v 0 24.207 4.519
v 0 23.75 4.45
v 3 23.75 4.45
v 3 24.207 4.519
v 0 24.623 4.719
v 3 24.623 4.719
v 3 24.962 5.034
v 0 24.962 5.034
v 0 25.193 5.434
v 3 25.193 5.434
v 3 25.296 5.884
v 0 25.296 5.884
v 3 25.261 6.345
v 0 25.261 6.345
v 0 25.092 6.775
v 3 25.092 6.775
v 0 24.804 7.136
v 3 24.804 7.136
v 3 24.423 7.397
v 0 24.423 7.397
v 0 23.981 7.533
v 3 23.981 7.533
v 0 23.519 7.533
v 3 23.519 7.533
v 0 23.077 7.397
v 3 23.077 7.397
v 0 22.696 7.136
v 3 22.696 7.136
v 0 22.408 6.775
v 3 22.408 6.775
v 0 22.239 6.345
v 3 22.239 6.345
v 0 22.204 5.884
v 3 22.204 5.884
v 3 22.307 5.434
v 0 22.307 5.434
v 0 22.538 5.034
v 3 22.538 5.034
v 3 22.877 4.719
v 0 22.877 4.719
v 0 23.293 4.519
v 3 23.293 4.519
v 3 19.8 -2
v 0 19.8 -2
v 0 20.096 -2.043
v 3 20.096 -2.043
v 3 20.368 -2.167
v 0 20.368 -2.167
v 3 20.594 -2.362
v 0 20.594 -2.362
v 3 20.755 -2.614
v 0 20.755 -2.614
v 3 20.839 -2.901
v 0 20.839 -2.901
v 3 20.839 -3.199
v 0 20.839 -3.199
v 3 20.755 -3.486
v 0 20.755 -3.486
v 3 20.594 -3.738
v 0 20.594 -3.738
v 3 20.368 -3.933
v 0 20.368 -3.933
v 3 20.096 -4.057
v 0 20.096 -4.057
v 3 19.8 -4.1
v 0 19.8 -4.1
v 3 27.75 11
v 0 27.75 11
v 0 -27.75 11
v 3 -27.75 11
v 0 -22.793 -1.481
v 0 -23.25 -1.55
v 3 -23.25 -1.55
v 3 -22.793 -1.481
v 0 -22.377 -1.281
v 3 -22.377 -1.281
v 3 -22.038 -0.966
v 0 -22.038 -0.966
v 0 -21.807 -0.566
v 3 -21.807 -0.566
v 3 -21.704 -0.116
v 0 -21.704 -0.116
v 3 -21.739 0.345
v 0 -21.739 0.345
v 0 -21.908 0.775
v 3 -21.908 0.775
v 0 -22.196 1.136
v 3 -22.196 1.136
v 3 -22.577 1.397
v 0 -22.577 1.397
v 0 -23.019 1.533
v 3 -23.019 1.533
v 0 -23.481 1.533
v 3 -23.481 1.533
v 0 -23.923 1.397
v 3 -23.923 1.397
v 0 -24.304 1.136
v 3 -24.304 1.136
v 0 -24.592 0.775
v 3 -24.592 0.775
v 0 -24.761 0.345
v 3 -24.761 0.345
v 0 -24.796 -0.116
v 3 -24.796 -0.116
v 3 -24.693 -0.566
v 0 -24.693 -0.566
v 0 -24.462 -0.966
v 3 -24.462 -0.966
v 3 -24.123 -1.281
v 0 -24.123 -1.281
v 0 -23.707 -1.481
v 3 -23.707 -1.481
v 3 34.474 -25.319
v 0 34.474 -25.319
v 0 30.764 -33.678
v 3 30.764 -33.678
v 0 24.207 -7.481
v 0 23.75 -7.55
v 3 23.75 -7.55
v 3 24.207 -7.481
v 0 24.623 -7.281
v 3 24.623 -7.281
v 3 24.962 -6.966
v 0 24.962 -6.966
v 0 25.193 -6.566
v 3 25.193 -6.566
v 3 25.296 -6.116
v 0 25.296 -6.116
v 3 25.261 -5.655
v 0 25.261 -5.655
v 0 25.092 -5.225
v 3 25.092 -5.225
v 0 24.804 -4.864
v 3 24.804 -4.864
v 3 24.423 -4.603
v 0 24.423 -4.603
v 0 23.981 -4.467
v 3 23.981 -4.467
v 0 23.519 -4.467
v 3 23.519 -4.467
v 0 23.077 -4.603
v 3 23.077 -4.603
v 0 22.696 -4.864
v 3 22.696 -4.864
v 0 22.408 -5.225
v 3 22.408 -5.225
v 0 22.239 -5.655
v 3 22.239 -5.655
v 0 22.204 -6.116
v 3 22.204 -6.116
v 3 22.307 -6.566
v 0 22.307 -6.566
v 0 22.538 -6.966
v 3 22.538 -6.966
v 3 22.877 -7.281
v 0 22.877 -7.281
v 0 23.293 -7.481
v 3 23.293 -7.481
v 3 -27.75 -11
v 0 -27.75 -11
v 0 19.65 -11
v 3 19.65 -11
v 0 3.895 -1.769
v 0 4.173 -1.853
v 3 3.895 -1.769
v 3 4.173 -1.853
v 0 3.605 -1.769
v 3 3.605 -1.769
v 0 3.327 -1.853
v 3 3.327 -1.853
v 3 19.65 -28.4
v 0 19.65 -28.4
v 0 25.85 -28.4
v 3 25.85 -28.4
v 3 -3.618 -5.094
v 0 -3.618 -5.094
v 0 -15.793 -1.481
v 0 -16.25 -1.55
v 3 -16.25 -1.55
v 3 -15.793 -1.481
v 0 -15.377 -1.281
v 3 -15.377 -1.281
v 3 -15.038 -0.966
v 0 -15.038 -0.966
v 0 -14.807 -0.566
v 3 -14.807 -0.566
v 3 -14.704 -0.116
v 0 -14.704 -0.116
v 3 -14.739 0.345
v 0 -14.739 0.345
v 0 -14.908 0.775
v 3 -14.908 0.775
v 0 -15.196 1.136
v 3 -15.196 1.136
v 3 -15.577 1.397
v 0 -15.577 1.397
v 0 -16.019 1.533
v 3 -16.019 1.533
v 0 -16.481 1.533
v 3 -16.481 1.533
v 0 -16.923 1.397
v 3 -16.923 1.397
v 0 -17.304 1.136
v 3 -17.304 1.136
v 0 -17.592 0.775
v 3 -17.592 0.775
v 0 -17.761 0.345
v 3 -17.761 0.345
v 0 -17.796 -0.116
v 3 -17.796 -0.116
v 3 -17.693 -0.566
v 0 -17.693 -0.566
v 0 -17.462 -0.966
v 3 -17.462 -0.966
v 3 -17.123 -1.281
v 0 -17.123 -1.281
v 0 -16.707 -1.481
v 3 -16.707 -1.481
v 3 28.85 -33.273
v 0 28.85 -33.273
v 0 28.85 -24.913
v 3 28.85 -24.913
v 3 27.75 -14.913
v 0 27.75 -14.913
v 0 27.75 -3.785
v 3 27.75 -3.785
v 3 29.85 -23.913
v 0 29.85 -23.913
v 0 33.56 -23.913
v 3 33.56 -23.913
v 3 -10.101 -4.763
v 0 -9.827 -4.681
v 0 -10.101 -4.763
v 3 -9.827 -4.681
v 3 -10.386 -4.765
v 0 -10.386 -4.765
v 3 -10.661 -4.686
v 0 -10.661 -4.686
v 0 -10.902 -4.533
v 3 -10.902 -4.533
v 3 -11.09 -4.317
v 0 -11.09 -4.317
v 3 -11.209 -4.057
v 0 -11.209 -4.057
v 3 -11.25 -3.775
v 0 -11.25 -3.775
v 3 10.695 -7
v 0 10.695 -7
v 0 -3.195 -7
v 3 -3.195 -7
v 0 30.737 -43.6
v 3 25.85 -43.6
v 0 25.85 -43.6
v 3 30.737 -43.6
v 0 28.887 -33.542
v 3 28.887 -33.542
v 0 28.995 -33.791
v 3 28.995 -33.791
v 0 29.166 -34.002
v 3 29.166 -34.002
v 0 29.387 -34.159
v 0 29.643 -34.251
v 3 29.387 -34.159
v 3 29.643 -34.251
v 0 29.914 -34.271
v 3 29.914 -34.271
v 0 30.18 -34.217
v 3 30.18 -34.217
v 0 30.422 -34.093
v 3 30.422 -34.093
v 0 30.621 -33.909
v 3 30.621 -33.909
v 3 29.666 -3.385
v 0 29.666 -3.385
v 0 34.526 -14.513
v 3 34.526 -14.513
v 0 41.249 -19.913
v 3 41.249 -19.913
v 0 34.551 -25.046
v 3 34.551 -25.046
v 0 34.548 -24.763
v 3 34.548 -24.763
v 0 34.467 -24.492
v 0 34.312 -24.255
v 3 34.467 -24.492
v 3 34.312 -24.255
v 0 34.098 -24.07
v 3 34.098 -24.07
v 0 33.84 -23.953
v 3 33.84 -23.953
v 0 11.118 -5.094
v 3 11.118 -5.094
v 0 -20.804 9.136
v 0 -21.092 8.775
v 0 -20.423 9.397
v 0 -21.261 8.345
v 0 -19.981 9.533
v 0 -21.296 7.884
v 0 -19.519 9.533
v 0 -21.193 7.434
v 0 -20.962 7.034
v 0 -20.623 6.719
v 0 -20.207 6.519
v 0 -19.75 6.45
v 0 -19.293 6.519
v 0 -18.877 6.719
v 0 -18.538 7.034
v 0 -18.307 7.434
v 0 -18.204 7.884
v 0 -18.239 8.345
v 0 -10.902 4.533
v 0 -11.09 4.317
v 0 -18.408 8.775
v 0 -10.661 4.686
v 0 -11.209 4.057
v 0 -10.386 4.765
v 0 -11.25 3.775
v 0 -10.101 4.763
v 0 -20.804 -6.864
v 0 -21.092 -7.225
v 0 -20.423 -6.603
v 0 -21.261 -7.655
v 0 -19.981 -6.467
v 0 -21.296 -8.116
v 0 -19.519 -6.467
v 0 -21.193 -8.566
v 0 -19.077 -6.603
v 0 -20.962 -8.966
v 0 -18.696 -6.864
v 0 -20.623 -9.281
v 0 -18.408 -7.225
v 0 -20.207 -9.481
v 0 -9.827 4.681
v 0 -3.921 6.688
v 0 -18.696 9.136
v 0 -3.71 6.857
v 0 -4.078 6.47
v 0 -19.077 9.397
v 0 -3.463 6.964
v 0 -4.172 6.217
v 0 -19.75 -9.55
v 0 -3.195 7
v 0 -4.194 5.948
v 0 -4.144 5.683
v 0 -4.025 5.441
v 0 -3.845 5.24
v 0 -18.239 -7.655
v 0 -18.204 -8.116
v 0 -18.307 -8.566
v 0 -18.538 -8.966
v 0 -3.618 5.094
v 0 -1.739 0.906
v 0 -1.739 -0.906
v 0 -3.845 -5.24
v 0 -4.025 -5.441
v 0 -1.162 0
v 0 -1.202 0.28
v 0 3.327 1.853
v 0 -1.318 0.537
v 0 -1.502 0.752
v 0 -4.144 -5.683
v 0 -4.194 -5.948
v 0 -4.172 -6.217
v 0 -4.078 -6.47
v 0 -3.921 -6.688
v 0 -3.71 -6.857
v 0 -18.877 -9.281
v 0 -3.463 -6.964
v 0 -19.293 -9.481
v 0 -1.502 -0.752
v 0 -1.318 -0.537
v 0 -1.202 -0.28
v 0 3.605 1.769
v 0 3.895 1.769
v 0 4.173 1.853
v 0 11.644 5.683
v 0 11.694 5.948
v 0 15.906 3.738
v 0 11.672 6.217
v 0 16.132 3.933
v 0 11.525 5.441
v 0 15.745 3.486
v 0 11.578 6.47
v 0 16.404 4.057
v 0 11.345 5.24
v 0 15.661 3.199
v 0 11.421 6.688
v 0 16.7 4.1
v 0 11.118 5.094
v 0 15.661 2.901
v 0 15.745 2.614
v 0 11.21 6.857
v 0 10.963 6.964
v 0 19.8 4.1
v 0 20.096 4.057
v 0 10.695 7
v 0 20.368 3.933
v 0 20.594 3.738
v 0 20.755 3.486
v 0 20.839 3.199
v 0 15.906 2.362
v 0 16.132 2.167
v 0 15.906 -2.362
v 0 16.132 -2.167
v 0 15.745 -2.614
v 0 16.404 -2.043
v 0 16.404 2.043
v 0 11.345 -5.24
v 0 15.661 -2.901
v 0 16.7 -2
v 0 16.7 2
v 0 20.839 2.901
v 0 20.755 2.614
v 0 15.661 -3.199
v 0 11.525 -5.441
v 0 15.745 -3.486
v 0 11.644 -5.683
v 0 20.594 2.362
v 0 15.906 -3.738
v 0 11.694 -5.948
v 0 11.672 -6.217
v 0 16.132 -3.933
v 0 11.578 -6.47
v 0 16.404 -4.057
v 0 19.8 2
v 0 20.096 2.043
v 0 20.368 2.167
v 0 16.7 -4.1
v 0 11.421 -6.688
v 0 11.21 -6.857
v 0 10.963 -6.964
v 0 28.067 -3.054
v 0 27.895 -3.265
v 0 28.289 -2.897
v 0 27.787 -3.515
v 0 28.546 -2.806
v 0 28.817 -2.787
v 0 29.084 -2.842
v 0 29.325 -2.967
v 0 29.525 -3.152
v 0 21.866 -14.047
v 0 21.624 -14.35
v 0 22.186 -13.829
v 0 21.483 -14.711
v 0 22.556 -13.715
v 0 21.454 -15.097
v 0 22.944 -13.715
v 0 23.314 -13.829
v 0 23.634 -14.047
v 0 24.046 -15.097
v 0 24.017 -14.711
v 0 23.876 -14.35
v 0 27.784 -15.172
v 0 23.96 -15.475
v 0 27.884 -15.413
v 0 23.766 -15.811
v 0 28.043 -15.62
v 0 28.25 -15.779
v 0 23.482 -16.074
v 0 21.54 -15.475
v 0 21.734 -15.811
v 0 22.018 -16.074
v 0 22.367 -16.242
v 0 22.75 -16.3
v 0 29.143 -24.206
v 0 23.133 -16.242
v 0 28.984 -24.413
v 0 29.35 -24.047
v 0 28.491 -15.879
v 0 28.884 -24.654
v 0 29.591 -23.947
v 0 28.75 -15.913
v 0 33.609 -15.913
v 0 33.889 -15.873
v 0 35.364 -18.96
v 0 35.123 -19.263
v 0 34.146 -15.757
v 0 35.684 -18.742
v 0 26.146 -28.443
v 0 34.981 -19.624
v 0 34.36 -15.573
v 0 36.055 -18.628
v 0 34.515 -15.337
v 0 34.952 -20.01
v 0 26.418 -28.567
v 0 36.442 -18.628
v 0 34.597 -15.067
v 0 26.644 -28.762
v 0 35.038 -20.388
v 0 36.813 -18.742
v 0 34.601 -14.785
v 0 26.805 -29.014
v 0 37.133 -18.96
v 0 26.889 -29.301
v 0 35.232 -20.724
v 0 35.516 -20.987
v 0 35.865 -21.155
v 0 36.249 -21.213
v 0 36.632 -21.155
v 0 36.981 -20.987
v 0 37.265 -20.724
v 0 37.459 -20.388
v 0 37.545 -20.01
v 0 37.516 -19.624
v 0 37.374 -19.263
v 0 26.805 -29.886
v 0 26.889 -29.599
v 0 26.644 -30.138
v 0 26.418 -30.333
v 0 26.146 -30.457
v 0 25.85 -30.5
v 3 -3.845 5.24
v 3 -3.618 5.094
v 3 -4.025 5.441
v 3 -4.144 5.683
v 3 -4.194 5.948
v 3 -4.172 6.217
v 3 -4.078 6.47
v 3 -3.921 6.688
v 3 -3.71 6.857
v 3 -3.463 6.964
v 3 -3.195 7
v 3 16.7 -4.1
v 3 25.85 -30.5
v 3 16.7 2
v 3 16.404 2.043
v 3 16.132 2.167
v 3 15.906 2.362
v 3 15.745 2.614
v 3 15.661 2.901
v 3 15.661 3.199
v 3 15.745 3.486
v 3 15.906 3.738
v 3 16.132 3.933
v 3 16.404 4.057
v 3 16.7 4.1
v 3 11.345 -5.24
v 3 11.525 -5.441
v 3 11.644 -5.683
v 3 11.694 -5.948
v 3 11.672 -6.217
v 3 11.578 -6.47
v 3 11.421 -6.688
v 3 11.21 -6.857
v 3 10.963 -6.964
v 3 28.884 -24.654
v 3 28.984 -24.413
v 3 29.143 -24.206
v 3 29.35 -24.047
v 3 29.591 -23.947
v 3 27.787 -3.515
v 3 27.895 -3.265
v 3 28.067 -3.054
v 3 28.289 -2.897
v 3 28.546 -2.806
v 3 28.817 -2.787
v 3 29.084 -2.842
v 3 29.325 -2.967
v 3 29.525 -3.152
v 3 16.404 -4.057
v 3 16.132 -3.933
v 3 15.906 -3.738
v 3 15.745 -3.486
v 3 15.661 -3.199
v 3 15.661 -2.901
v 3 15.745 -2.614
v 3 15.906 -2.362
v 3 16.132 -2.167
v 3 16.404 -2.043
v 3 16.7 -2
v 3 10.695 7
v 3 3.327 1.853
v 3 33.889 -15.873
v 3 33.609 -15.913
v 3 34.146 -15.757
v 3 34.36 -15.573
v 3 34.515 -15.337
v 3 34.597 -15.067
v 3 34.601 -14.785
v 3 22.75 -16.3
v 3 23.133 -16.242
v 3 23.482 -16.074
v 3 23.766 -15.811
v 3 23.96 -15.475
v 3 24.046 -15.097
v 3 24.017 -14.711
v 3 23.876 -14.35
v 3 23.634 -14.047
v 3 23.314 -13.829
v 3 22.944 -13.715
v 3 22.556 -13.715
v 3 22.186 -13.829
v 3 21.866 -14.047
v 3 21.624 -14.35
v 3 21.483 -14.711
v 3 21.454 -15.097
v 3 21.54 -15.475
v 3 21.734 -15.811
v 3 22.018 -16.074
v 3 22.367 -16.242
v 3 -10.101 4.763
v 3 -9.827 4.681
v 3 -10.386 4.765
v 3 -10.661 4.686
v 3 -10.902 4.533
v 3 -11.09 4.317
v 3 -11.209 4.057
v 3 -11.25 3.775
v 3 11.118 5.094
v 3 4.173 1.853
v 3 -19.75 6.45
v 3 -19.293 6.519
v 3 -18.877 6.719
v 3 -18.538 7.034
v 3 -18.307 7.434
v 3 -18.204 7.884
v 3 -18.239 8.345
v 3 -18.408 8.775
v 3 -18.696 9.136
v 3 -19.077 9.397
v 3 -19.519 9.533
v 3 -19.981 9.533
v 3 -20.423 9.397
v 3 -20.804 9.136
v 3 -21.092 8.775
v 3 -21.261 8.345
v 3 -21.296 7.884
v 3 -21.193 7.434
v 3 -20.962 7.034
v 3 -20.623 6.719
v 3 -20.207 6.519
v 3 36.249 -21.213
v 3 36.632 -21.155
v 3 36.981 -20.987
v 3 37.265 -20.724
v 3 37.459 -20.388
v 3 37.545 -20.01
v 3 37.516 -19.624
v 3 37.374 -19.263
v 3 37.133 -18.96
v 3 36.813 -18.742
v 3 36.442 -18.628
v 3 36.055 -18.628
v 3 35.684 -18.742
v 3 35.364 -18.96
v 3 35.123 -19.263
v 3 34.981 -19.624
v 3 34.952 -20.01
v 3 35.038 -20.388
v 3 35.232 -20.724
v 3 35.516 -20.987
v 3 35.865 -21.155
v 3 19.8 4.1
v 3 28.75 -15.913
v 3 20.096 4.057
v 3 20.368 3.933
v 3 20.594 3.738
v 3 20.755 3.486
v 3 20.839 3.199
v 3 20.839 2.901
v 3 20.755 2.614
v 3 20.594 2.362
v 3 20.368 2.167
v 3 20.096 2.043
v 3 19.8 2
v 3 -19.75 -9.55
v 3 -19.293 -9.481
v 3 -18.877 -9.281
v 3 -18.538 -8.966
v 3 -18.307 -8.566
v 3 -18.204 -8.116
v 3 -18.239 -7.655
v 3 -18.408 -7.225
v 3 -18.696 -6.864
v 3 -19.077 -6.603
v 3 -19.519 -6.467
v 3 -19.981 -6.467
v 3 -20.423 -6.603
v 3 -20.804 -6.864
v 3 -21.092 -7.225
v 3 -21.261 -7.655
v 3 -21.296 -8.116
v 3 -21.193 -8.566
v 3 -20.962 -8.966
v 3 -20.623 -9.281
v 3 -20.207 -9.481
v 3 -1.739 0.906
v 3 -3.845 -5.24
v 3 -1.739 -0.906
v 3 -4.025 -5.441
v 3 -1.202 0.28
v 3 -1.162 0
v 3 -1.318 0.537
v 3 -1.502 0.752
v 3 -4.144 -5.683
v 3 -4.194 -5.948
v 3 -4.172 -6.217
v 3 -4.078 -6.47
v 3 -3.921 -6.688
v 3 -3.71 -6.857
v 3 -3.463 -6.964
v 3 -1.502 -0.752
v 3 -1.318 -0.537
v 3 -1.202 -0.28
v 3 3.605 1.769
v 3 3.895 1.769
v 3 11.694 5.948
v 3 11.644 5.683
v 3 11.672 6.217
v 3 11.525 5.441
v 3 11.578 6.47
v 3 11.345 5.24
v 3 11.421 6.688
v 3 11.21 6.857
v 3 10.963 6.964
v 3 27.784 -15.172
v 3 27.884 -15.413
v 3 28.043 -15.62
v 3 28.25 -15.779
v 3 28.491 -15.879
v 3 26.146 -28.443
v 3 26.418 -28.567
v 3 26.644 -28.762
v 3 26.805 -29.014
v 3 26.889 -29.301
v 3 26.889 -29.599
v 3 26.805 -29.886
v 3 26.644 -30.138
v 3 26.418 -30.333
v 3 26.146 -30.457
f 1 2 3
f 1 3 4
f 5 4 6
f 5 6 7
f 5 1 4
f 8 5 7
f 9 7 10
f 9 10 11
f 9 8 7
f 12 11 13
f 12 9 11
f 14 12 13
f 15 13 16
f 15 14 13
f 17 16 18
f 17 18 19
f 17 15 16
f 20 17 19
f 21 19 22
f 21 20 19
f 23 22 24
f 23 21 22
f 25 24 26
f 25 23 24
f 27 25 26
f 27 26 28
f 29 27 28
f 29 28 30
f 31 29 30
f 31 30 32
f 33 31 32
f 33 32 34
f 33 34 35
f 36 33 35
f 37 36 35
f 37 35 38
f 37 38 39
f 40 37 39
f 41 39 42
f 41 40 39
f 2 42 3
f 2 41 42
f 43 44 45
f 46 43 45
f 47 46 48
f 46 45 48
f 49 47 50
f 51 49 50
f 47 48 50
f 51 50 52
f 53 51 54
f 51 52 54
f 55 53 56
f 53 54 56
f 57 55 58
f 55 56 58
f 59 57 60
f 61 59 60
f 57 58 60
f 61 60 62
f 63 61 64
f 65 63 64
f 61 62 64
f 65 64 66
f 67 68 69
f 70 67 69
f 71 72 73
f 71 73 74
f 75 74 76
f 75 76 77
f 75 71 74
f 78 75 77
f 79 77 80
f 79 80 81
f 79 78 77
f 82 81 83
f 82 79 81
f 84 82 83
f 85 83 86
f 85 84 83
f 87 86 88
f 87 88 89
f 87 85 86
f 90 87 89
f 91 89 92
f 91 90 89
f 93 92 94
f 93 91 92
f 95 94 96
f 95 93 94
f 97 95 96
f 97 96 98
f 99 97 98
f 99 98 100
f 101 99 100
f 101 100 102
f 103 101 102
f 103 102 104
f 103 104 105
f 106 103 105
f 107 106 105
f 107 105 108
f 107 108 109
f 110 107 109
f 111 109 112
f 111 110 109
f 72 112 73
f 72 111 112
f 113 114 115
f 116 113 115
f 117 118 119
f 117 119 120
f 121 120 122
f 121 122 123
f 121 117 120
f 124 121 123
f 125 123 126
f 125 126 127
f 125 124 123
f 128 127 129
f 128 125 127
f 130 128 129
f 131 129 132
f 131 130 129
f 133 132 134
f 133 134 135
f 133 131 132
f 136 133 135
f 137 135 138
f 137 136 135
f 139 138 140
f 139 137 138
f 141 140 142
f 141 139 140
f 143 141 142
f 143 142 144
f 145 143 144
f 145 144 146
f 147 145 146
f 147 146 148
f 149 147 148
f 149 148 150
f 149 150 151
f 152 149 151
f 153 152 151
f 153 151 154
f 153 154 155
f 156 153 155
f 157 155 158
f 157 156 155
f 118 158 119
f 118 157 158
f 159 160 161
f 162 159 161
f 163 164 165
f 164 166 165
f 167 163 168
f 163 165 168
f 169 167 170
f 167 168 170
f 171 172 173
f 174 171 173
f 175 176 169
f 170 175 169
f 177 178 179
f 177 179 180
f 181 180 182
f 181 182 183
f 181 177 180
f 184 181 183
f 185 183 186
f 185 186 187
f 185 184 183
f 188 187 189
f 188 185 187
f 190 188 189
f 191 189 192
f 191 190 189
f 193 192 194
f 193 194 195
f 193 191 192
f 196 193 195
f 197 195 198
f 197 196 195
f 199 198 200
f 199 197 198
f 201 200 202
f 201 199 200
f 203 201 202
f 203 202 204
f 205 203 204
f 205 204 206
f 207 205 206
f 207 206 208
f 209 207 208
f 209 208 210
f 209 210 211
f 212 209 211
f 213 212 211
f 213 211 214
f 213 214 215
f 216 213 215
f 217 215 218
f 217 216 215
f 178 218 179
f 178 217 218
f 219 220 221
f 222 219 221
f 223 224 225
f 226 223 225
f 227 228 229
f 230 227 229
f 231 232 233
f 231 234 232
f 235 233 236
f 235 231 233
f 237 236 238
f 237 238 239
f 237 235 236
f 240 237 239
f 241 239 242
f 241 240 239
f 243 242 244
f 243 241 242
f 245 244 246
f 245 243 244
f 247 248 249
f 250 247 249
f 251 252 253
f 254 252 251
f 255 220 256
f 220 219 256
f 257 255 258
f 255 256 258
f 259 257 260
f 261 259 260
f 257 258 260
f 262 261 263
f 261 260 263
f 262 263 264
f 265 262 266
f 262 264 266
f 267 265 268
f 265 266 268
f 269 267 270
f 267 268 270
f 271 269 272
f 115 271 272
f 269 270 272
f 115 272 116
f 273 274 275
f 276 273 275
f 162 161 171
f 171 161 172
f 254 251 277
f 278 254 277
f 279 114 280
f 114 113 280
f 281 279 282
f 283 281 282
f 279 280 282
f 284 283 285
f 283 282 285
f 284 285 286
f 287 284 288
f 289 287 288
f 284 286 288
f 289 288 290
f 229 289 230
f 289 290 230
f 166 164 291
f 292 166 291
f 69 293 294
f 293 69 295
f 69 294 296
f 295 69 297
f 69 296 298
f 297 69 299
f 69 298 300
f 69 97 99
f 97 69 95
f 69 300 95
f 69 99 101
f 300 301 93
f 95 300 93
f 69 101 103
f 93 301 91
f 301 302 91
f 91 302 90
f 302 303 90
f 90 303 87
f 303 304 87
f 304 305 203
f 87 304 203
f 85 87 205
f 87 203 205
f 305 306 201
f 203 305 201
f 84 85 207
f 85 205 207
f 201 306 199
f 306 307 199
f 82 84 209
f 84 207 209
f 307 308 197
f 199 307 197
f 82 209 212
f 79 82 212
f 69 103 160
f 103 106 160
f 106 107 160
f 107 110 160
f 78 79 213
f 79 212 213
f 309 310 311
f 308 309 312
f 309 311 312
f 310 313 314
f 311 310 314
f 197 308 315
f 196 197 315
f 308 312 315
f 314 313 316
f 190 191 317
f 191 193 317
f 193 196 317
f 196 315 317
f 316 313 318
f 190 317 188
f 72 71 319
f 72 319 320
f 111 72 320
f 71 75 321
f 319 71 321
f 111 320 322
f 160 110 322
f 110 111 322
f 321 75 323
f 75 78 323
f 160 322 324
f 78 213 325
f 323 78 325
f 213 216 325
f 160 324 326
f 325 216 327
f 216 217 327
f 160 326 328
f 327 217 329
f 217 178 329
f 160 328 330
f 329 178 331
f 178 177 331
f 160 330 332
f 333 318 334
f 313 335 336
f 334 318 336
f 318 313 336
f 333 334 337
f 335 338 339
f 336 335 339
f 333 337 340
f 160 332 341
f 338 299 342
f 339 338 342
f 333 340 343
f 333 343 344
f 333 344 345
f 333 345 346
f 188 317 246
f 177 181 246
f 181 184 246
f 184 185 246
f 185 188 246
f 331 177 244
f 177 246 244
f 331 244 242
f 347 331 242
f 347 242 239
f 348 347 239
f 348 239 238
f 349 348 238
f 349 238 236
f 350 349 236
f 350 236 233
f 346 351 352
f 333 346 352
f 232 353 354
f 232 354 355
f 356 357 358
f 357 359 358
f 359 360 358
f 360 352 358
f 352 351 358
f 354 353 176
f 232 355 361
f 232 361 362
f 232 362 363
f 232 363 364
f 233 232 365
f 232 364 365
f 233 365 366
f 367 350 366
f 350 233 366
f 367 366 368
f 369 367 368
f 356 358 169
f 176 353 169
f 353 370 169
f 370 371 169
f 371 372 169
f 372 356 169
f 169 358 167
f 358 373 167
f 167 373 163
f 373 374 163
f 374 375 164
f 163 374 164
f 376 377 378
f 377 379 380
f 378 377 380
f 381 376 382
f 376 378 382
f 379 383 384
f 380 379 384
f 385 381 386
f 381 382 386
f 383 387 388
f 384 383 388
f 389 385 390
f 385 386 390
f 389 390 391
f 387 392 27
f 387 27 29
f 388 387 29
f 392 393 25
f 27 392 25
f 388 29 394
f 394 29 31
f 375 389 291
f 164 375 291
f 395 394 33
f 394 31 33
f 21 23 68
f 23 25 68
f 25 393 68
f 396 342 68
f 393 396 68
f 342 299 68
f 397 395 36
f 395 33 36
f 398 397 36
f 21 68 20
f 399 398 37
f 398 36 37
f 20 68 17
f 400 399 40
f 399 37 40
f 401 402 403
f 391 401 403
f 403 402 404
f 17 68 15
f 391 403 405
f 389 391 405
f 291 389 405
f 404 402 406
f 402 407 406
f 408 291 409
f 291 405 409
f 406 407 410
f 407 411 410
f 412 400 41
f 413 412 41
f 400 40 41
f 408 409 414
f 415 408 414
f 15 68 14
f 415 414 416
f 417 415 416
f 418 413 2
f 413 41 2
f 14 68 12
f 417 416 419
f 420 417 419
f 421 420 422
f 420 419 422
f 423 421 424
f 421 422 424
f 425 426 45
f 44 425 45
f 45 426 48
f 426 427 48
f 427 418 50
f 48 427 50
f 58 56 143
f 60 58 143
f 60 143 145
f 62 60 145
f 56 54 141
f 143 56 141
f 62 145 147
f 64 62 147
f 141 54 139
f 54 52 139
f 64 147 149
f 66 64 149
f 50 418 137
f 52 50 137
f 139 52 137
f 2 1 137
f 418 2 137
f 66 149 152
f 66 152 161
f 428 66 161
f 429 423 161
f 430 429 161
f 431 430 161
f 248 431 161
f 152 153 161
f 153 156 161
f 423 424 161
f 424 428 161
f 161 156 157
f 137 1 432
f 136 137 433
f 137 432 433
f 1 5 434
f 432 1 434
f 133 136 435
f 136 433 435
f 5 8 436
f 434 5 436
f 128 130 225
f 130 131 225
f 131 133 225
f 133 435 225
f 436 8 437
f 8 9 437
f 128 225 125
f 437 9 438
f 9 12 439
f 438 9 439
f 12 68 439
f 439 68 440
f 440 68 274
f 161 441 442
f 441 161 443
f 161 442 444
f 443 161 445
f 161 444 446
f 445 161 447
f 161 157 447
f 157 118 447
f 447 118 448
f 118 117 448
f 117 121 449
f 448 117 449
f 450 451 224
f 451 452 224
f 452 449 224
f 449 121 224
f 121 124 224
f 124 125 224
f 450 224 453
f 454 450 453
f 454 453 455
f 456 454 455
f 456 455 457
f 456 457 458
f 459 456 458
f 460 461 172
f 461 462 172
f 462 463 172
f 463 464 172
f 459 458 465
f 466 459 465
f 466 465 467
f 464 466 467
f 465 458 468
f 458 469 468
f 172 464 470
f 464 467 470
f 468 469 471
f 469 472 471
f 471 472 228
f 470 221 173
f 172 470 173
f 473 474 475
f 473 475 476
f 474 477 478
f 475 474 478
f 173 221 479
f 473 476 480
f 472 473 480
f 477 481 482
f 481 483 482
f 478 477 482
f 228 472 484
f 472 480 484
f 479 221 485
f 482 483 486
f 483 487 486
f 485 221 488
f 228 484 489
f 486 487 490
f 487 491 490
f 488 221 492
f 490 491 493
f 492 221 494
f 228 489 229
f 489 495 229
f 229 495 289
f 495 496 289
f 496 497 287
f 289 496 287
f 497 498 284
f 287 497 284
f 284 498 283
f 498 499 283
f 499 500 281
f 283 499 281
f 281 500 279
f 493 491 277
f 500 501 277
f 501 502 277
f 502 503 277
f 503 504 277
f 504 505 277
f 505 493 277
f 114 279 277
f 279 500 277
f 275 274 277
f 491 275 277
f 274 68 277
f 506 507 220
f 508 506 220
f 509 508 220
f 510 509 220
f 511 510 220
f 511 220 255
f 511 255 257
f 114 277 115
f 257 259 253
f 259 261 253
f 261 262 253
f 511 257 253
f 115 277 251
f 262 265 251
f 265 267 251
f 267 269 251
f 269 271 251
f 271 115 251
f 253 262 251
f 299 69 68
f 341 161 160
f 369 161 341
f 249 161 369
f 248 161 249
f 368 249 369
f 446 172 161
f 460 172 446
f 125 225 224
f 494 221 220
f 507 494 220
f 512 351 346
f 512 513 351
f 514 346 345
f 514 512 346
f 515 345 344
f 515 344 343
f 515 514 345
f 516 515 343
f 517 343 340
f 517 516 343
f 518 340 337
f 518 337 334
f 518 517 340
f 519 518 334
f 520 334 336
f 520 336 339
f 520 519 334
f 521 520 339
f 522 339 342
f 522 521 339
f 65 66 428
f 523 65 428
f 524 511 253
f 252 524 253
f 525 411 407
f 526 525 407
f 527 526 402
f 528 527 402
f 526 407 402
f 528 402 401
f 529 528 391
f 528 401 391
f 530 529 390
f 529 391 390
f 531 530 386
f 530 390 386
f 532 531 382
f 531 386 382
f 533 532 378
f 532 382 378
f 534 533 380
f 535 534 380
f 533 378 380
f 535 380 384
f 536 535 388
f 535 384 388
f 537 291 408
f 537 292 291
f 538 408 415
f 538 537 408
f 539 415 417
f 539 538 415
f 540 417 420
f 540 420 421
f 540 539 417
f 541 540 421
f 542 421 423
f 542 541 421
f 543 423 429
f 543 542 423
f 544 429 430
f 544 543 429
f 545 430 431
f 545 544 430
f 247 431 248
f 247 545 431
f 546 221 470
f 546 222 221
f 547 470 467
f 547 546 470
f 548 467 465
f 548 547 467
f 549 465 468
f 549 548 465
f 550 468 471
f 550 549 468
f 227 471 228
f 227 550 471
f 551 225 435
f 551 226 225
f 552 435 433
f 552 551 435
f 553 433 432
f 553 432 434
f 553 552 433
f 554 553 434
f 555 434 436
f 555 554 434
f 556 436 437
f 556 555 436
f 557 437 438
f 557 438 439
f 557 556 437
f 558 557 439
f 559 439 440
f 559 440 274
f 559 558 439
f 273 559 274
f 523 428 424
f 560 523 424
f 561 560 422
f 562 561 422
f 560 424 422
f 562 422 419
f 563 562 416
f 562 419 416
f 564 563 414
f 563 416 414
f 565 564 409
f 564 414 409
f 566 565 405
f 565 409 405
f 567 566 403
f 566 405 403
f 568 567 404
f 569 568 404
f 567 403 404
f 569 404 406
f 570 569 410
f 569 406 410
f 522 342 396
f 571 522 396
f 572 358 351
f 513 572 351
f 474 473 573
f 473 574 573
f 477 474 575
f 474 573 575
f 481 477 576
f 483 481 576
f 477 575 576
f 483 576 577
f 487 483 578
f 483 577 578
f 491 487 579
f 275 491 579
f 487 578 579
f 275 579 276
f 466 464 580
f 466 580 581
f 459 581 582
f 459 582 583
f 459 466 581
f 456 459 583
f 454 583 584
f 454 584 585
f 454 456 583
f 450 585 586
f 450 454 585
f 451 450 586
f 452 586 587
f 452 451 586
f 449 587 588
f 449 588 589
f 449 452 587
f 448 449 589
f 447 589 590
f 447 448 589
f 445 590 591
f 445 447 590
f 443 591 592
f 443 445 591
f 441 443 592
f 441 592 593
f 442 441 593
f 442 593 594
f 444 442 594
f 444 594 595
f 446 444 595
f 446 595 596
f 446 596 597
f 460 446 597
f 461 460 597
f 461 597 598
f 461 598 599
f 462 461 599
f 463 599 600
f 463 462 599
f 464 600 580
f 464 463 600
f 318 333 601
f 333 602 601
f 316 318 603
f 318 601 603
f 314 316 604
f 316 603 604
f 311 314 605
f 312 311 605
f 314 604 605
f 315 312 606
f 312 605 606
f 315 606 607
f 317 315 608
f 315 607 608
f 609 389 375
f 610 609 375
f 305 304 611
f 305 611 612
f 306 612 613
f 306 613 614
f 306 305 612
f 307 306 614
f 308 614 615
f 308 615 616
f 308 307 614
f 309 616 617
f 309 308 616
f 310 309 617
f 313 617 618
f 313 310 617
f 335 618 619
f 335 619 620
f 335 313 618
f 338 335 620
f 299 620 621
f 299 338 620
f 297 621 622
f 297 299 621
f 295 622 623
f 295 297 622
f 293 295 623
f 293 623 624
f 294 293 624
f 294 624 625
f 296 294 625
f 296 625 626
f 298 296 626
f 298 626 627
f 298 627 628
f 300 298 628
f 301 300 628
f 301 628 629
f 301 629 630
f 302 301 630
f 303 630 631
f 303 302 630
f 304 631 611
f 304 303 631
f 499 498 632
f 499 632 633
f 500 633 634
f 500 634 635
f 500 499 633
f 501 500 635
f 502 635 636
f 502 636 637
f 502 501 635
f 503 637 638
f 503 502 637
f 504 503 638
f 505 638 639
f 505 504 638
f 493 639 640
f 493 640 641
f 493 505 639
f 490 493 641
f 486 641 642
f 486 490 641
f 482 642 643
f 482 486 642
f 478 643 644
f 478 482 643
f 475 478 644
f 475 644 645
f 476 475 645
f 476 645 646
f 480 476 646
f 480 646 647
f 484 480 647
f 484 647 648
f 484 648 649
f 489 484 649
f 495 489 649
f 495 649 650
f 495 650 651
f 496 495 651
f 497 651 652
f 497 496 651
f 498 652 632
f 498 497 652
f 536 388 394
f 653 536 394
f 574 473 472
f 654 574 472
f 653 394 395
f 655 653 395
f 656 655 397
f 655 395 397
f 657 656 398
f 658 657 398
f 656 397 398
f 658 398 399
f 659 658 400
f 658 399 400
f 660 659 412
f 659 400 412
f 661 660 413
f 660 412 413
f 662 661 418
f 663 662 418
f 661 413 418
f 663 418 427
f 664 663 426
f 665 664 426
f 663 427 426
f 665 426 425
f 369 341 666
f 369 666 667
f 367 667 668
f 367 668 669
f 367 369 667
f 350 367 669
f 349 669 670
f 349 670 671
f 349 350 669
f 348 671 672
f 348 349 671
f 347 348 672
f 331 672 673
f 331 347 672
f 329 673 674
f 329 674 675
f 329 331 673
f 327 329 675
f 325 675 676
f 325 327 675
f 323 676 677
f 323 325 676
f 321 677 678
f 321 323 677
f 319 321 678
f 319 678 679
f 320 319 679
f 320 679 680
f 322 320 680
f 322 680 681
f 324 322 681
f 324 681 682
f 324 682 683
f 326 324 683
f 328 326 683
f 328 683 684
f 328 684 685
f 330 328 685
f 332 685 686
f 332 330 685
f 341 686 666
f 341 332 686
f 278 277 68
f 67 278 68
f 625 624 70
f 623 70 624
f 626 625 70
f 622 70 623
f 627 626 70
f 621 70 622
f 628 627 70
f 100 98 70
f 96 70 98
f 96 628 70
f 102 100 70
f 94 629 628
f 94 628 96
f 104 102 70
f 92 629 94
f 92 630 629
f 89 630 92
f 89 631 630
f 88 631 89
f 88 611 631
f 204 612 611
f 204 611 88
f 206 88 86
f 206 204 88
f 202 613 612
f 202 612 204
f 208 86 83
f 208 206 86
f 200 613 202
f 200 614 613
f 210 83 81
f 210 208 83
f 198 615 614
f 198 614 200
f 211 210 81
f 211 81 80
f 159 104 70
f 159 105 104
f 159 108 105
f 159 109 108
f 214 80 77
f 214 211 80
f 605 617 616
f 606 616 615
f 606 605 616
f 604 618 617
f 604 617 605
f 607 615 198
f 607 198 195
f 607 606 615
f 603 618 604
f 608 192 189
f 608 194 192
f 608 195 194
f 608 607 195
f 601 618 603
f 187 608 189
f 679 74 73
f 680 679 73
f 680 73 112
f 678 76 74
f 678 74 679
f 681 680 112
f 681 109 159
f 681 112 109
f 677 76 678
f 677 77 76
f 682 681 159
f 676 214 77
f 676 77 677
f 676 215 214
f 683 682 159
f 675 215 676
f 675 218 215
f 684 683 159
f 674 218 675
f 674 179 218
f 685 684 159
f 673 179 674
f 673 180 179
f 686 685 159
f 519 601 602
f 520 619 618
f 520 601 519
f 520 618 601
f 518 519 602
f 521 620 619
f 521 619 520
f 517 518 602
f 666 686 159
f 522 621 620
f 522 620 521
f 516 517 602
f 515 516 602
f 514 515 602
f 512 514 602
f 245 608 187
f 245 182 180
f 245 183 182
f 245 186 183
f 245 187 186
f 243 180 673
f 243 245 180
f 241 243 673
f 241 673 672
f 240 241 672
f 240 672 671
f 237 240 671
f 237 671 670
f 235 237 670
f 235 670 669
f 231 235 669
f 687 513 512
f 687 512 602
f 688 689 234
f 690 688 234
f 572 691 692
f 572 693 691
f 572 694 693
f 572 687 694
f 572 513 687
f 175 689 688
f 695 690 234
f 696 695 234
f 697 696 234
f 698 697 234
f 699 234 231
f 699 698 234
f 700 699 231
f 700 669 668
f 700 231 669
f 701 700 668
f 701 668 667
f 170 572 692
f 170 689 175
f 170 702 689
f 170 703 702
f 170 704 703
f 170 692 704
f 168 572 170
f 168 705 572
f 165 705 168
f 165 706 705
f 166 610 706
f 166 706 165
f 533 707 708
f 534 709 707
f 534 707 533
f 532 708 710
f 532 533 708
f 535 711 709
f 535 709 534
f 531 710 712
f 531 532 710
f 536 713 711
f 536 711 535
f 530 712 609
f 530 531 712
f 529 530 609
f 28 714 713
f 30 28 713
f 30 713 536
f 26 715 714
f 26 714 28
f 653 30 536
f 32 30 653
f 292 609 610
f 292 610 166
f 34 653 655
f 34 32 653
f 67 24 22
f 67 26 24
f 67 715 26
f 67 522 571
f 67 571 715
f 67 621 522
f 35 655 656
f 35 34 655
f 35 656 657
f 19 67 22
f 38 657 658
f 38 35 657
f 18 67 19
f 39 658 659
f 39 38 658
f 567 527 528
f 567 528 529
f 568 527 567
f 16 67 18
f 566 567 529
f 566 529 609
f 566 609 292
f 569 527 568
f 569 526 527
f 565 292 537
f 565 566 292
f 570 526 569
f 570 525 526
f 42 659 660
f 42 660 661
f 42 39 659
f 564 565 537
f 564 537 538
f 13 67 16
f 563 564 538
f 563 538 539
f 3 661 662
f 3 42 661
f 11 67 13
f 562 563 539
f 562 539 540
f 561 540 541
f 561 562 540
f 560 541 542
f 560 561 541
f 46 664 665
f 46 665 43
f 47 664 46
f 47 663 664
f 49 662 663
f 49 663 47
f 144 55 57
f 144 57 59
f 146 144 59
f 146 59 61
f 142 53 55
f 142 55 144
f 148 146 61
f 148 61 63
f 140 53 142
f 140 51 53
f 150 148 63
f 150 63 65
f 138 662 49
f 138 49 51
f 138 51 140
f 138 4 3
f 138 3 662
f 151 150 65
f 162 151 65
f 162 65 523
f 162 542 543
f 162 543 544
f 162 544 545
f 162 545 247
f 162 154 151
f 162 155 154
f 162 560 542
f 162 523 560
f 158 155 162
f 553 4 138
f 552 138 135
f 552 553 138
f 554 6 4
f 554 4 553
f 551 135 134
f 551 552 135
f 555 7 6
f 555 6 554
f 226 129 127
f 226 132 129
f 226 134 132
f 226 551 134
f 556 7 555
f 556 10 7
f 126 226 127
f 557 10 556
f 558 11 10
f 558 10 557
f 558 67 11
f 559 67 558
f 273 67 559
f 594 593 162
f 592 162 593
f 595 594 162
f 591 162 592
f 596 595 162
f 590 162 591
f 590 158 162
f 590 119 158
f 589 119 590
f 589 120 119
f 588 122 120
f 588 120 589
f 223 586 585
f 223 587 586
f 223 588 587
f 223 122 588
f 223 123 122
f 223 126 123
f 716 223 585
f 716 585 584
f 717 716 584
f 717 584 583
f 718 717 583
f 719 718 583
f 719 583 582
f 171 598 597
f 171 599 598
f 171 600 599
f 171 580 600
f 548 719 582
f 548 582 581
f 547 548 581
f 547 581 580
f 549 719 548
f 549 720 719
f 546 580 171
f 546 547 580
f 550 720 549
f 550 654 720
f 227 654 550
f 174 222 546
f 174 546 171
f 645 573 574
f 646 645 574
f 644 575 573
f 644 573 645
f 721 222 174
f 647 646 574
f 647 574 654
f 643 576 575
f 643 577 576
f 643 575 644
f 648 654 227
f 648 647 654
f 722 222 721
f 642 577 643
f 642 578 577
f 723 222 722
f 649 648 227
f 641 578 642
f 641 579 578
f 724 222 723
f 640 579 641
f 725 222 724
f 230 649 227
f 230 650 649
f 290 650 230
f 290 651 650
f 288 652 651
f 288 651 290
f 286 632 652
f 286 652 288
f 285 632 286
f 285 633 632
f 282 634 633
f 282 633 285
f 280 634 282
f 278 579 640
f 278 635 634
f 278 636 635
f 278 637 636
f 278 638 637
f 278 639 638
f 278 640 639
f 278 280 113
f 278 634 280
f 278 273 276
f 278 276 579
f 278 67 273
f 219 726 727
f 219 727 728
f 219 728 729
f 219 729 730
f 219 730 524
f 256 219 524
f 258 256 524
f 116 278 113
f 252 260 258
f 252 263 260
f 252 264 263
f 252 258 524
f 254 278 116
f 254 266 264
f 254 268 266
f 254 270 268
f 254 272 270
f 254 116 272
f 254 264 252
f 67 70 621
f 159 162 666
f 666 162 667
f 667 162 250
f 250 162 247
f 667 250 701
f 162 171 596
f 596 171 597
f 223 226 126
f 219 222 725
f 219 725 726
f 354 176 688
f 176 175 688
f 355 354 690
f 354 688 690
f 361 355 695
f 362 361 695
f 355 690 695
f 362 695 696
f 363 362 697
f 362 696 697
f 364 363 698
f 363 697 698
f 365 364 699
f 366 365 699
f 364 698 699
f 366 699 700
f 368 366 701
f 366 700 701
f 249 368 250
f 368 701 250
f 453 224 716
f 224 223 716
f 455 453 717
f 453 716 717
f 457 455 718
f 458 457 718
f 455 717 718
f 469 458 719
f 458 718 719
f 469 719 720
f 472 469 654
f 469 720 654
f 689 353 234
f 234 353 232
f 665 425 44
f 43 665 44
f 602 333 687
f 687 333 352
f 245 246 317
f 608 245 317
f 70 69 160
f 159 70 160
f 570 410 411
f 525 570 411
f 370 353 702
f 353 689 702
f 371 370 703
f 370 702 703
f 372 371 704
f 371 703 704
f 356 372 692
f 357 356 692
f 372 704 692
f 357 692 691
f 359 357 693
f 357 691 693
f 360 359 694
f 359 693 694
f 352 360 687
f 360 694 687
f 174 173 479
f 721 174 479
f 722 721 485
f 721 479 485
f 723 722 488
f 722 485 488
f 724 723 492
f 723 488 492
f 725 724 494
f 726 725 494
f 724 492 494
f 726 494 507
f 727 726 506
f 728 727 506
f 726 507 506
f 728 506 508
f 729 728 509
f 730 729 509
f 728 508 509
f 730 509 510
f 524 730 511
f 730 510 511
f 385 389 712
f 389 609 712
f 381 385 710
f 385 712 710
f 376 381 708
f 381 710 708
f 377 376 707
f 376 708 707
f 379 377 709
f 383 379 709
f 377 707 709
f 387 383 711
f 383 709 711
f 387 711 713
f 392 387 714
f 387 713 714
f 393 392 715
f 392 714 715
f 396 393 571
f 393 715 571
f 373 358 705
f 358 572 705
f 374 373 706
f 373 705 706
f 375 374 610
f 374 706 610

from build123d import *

# Parameters (mm, degrees)
SKETCH_1_R          = 1.55
SKETCH_1_R_2        = 1.3
EXTRUDE_1_DEPTH     = 3
FILLET_1_R          = 1
SKETCH_2_W          = 7.568949752
SKETCH_2_H          = 24.928305666
CUT_EXTRUDE_1_DEPTH = 10


with BuildPart() as part:
    # 草图1 → 凸台-拉伸1 (new body)
    with BuildSketch(Plane(origin=(0, 0, 0), x_dir=(0, 0, -1), z_dir=(1, 0, 0))):
        with BuildLine():
            Line((-11, -27.75), (11, -27.75))
            Line((11, -27.75), (11, 19.65))
            Line((11, 19.65), (28.4, 19.65))
            Line((28.4, 19.65), (28.4, 25.85))
            ThreePointArc((28.4, 25.85), (29.45, 26.9), (30.5, 25.85))
            Line((30.5, 25.85), (43.6, 25.85))
            Line((43.6, 25.85), (43.6, 19.65))
            Line((43.6, 19.65), (45.6, 19.65))
            Line((45.6, 19.65), (45.6, 29.85))
            Line((45.6, 29.85), (19.913066695, 41.248539803))
            Line((19.913066695, 41.248539803), (-11, 27.75))
            Line((-11, 27.75), (-11, -27.75))
        make_face()
        with Locations((-8, -19.75)):
            Circle(SKETCH_1_R, mode=Mode.SUBTRACT)
        with Locations((0, -23.25)):
            Circle(SKETCH_1_R, mode=Mode.SUBTRACT)
        with Locations((0, -16.25)):
            Circle(SKETCH_1_R, mode=Mode.SUBTRACT)
        with Locations((8, -19.75)):
            Circle(SKETCH_1_R, mode=Mode.SUBTRACT)
        Polygon((5.344705464, -11.25), (-5.344705464, -11.25), (0, 0.202940281), align=None, mode=Mode.SUBTRACT)
        Polygon((-7, -7.702940281), (-7, 15.202940281), (-1.655294536, 3.75), align=None, mode=Mode.SUBTRACT)
        Polygon((7, 15.202940281), (7, -7.702940281), (1.655294536, 3.75), align=None, mode=Mode.SUBTRACT)
        with Locations((-6, 23.75)):
            Circle(SKETCH_1_R, mode=Mode.SUBTRACT)
        with BuildLine():
            Line((2, 16.7), (-2, 16.7))
            ThreePointArc((-2, 16.7), (-3.05, 15.65), (-4.1, 16.7))
            Line((-4.1, 16.7), (-4.1, 19.8))
            ThreePointArc((-4.1, 19.8), (-3.05, 20.85), (-2, 19.8))
            Line((-2, 19.8), (2, 19.8))
            ThreePointArc((2, 19.8), (3.05, 20.85), (4.1, 19.8))
            Line((4.1, 19.8), (4.1, 16.7))
            ThreePointArc((4.1, 16.7), (3.05, 15.65), (2, 16.7))
        make_face(mode=Mode.SUBTRACT)
        with Locations((6, 23.75)):
            Circle(SKETCH_1_R, mode=Mode.SUBTRACT)
        with Locations((15, 22.75)):
            Circle(SKETCH_1_R_2, mode=Mode.SUBTRACT)
        Polygon((11, 27.75), (-1.004338059, 27.75), (15.913066695, 35.137175905), (15.913066695, 27.75), align=None, mode=Mode.SUBTRACT)
        Polygon((23.913066695, 28.85), (23.913066695, 35.097405162), (37.991771729, 28.85), align=None, mode=Mode.SUBTRACT)
        with Locations((19.913066695, 36.248539803)):
            Circle(SKETCH_1_R_2, mode=Mode.SUBTRACT)
    extrude(amount=EXTRUDE_1_DEPTH)

    # 圆角1
    fillet_1_edges = [part.edges().sort_by_distance(p)[0] for p in [
        (1.5, 35.097405162, -23.913066695),
        (1.5, 28.85, -23.913066695),
        (1.5, 28.85, -37.991771729),
        (1.5, 35.137175905, -15.913066695),
        (1.5, 27.75, 1.004338059),
        (1.5, 27.75, -15.913066695),
        (1.5, 15.202940281, 7),
        (1.5, -7.702940281, 7),
        (1.5, 3.75, 1.655294536),
        (1.5, -7.702940281, -7),
        (1.5, 15.202940281, -7),
        (1.5, 3.75, -1.655294536),
        (1.5, -11.25, 5.344705464),
        (1.5, -11.25, -5.344705464),
        (1.5, 0.202940281, 0),
    ]]
    fillet(fillet_1_edges, radius=FILLET_1_R)

    # 草图2 → 切除-拉伸1 (cut)
    with BuildSketch(Plane(origin=(3, 0, 0), x_dir=(0, 0, -1), z_dir=(1, 0, 0))):
        with Locations((47.384474876, 32.114152833)):
            Rectangle(SKETCH_2_W, SKETCH_2_H)
    extrude(amount=-CUT_EXTRUDE_1_DEPTH, mode=Mode.SUBTRACT)


solid = part.part
